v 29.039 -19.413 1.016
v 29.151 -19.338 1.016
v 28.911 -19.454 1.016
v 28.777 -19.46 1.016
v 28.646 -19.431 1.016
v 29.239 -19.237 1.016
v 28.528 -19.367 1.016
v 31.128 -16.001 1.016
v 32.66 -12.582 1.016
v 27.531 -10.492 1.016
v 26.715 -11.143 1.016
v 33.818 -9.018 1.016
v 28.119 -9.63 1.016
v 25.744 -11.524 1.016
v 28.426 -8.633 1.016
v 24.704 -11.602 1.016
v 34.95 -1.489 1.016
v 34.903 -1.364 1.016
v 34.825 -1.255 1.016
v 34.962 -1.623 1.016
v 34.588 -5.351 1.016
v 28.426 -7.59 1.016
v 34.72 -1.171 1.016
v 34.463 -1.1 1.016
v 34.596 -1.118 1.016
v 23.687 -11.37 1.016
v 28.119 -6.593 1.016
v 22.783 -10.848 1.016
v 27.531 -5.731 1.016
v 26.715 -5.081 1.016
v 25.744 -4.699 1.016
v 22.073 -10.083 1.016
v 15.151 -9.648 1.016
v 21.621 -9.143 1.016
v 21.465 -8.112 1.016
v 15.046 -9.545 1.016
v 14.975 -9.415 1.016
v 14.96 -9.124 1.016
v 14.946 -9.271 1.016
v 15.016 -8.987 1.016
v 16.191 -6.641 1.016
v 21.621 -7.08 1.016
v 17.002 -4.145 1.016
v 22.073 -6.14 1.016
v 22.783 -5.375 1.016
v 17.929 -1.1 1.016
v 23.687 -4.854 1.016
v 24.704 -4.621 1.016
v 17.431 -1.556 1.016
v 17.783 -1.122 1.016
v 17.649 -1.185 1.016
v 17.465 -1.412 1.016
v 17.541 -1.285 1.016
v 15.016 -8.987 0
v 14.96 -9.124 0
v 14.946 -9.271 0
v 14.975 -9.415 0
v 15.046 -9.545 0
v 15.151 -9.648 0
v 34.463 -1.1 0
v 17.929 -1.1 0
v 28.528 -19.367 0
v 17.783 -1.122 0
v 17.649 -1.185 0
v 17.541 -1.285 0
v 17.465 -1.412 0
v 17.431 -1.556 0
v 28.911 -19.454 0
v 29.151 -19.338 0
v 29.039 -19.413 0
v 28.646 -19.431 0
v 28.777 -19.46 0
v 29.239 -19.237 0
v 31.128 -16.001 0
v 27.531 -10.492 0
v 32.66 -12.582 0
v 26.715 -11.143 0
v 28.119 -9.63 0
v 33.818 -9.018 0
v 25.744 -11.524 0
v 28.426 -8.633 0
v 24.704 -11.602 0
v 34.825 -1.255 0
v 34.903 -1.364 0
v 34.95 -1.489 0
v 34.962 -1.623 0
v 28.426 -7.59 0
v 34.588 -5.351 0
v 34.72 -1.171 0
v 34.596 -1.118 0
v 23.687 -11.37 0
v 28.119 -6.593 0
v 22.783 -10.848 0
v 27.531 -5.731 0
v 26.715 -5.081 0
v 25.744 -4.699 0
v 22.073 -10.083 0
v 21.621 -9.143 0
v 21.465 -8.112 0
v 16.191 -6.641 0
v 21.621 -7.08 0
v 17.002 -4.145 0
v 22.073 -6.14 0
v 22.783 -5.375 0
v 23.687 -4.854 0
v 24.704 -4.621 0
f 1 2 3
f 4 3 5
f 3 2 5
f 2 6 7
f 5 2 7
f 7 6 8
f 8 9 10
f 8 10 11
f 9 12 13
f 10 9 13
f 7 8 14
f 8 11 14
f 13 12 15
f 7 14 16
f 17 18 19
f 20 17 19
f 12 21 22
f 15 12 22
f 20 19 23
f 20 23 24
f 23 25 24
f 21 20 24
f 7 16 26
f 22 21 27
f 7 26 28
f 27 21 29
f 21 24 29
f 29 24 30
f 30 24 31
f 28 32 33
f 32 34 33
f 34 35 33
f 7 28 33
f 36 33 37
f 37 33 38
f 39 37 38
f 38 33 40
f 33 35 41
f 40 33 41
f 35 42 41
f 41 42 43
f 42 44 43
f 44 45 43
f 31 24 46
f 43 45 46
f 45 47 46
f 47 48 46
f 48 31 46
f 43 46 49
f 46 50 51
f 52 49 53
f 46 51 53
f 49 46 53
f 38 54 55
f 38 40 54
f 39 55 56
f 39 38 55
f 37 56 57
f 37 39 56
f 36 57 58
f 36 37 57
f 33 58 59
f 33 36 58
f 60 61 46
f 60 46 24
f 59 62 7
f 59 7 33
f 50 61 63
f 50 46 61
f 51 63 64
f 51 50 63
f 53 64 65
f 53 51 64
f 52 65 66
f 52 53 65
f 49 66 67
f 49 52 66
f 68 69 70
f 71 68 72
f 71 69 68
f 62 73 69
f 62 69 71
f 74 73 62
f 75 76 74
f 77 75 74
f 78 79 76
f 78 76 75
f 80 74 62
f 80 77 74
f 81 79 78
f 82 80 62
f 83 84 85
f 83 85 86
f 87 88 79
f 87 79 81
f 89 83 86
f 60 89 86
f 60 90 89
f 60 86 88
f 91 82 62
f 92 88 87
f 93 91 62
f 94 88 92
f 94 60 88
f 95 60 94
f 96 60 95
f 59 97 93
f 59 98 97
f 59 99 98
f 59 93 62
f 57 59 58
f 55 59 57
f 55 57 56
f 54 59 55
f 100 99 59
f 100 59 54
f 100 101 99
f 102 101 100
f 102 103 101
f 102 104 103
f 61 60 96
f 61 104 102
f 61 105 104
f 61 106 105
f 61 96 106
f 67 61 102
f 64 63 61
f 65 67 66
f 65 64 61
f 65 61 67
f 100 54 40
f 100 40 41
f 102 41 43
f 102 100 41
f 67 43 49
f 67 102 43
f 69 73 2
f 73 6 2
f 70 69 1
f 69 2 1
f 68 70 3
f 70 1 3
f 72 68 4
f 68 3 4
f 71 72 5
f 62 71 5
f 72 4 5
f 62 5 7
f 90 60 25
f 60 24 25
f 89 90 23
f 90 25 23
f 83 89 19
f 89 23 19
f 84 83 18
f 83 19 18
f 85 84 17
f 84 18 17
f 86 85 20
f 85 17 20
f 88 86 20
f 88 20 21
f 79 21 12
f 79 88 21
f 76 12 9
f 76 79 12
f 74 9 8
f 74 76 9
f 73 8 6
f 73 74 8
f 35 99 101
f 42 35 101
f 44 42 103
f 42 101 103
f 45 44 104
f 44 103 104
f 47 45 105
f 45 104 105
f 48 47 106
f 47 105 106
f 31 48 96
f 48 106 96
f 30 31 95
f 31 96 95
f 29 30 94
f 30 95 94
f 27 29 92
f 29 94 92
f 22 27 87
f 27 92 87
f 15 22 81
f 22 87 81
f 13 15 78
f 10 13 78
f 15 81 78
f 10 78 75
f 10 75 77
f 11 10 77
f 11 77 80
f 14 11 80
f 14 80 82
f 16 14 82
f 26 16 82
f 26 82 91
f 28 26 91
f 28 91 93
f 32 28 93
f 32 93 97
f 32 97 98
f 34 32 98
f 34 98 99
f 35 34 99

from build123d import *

# Parameters (mm, degrees)
BOSS_EXTRUDE1_DEPTH  = 1.016
M6_CLEARANCE_HOLE1_D = 7
FILLET2_R            = 0.5


with BuildPart() as part:
    # Sketch1 → Boss-Extrude1 (new body)
    with BuildSketch(Plane.XY):
        with BuildLine():
            Line((17.465394356, -1.1), (34.982710015, -1.1))
            ThreePointArc((34.982710015, -1.1), (33.28697807, -10.815594803), (28.948170689, -19.672402338))
            Line((28.948170689, -19.672402338), (14.776364625, -9.375982534))
            ThreePointArc((14.776364625, -9.375982534), (16.643489035, -5.407797402), (17.465394356, -1.1))
        make_face()
    extrude(amount=BOSS_EXTRUDE1_DEPTH)

    # M6 Clearance Hole1 (through all)
    with Locations(Plane.XY.offset(1.016)):
        with Locations((24.965233553, -8.111696102)):
            Hole(M6_CLEARANCE_HOLE1_D / 2)

    # Fillet2
    fillet2_edges = [part.edges().sort_by_distance(p)[0] for p in [
        (17.465394356, -1.1, 0.508),
        (34.982710015, -1.1, 0.508),
        (28.948170689, -19.672402338, 0.508),
        (14.776364625, -9.375982534, 0.508),
    ]]
    fillet(fillet2_edges, radius=FILLET2_R)


solid = part.part
